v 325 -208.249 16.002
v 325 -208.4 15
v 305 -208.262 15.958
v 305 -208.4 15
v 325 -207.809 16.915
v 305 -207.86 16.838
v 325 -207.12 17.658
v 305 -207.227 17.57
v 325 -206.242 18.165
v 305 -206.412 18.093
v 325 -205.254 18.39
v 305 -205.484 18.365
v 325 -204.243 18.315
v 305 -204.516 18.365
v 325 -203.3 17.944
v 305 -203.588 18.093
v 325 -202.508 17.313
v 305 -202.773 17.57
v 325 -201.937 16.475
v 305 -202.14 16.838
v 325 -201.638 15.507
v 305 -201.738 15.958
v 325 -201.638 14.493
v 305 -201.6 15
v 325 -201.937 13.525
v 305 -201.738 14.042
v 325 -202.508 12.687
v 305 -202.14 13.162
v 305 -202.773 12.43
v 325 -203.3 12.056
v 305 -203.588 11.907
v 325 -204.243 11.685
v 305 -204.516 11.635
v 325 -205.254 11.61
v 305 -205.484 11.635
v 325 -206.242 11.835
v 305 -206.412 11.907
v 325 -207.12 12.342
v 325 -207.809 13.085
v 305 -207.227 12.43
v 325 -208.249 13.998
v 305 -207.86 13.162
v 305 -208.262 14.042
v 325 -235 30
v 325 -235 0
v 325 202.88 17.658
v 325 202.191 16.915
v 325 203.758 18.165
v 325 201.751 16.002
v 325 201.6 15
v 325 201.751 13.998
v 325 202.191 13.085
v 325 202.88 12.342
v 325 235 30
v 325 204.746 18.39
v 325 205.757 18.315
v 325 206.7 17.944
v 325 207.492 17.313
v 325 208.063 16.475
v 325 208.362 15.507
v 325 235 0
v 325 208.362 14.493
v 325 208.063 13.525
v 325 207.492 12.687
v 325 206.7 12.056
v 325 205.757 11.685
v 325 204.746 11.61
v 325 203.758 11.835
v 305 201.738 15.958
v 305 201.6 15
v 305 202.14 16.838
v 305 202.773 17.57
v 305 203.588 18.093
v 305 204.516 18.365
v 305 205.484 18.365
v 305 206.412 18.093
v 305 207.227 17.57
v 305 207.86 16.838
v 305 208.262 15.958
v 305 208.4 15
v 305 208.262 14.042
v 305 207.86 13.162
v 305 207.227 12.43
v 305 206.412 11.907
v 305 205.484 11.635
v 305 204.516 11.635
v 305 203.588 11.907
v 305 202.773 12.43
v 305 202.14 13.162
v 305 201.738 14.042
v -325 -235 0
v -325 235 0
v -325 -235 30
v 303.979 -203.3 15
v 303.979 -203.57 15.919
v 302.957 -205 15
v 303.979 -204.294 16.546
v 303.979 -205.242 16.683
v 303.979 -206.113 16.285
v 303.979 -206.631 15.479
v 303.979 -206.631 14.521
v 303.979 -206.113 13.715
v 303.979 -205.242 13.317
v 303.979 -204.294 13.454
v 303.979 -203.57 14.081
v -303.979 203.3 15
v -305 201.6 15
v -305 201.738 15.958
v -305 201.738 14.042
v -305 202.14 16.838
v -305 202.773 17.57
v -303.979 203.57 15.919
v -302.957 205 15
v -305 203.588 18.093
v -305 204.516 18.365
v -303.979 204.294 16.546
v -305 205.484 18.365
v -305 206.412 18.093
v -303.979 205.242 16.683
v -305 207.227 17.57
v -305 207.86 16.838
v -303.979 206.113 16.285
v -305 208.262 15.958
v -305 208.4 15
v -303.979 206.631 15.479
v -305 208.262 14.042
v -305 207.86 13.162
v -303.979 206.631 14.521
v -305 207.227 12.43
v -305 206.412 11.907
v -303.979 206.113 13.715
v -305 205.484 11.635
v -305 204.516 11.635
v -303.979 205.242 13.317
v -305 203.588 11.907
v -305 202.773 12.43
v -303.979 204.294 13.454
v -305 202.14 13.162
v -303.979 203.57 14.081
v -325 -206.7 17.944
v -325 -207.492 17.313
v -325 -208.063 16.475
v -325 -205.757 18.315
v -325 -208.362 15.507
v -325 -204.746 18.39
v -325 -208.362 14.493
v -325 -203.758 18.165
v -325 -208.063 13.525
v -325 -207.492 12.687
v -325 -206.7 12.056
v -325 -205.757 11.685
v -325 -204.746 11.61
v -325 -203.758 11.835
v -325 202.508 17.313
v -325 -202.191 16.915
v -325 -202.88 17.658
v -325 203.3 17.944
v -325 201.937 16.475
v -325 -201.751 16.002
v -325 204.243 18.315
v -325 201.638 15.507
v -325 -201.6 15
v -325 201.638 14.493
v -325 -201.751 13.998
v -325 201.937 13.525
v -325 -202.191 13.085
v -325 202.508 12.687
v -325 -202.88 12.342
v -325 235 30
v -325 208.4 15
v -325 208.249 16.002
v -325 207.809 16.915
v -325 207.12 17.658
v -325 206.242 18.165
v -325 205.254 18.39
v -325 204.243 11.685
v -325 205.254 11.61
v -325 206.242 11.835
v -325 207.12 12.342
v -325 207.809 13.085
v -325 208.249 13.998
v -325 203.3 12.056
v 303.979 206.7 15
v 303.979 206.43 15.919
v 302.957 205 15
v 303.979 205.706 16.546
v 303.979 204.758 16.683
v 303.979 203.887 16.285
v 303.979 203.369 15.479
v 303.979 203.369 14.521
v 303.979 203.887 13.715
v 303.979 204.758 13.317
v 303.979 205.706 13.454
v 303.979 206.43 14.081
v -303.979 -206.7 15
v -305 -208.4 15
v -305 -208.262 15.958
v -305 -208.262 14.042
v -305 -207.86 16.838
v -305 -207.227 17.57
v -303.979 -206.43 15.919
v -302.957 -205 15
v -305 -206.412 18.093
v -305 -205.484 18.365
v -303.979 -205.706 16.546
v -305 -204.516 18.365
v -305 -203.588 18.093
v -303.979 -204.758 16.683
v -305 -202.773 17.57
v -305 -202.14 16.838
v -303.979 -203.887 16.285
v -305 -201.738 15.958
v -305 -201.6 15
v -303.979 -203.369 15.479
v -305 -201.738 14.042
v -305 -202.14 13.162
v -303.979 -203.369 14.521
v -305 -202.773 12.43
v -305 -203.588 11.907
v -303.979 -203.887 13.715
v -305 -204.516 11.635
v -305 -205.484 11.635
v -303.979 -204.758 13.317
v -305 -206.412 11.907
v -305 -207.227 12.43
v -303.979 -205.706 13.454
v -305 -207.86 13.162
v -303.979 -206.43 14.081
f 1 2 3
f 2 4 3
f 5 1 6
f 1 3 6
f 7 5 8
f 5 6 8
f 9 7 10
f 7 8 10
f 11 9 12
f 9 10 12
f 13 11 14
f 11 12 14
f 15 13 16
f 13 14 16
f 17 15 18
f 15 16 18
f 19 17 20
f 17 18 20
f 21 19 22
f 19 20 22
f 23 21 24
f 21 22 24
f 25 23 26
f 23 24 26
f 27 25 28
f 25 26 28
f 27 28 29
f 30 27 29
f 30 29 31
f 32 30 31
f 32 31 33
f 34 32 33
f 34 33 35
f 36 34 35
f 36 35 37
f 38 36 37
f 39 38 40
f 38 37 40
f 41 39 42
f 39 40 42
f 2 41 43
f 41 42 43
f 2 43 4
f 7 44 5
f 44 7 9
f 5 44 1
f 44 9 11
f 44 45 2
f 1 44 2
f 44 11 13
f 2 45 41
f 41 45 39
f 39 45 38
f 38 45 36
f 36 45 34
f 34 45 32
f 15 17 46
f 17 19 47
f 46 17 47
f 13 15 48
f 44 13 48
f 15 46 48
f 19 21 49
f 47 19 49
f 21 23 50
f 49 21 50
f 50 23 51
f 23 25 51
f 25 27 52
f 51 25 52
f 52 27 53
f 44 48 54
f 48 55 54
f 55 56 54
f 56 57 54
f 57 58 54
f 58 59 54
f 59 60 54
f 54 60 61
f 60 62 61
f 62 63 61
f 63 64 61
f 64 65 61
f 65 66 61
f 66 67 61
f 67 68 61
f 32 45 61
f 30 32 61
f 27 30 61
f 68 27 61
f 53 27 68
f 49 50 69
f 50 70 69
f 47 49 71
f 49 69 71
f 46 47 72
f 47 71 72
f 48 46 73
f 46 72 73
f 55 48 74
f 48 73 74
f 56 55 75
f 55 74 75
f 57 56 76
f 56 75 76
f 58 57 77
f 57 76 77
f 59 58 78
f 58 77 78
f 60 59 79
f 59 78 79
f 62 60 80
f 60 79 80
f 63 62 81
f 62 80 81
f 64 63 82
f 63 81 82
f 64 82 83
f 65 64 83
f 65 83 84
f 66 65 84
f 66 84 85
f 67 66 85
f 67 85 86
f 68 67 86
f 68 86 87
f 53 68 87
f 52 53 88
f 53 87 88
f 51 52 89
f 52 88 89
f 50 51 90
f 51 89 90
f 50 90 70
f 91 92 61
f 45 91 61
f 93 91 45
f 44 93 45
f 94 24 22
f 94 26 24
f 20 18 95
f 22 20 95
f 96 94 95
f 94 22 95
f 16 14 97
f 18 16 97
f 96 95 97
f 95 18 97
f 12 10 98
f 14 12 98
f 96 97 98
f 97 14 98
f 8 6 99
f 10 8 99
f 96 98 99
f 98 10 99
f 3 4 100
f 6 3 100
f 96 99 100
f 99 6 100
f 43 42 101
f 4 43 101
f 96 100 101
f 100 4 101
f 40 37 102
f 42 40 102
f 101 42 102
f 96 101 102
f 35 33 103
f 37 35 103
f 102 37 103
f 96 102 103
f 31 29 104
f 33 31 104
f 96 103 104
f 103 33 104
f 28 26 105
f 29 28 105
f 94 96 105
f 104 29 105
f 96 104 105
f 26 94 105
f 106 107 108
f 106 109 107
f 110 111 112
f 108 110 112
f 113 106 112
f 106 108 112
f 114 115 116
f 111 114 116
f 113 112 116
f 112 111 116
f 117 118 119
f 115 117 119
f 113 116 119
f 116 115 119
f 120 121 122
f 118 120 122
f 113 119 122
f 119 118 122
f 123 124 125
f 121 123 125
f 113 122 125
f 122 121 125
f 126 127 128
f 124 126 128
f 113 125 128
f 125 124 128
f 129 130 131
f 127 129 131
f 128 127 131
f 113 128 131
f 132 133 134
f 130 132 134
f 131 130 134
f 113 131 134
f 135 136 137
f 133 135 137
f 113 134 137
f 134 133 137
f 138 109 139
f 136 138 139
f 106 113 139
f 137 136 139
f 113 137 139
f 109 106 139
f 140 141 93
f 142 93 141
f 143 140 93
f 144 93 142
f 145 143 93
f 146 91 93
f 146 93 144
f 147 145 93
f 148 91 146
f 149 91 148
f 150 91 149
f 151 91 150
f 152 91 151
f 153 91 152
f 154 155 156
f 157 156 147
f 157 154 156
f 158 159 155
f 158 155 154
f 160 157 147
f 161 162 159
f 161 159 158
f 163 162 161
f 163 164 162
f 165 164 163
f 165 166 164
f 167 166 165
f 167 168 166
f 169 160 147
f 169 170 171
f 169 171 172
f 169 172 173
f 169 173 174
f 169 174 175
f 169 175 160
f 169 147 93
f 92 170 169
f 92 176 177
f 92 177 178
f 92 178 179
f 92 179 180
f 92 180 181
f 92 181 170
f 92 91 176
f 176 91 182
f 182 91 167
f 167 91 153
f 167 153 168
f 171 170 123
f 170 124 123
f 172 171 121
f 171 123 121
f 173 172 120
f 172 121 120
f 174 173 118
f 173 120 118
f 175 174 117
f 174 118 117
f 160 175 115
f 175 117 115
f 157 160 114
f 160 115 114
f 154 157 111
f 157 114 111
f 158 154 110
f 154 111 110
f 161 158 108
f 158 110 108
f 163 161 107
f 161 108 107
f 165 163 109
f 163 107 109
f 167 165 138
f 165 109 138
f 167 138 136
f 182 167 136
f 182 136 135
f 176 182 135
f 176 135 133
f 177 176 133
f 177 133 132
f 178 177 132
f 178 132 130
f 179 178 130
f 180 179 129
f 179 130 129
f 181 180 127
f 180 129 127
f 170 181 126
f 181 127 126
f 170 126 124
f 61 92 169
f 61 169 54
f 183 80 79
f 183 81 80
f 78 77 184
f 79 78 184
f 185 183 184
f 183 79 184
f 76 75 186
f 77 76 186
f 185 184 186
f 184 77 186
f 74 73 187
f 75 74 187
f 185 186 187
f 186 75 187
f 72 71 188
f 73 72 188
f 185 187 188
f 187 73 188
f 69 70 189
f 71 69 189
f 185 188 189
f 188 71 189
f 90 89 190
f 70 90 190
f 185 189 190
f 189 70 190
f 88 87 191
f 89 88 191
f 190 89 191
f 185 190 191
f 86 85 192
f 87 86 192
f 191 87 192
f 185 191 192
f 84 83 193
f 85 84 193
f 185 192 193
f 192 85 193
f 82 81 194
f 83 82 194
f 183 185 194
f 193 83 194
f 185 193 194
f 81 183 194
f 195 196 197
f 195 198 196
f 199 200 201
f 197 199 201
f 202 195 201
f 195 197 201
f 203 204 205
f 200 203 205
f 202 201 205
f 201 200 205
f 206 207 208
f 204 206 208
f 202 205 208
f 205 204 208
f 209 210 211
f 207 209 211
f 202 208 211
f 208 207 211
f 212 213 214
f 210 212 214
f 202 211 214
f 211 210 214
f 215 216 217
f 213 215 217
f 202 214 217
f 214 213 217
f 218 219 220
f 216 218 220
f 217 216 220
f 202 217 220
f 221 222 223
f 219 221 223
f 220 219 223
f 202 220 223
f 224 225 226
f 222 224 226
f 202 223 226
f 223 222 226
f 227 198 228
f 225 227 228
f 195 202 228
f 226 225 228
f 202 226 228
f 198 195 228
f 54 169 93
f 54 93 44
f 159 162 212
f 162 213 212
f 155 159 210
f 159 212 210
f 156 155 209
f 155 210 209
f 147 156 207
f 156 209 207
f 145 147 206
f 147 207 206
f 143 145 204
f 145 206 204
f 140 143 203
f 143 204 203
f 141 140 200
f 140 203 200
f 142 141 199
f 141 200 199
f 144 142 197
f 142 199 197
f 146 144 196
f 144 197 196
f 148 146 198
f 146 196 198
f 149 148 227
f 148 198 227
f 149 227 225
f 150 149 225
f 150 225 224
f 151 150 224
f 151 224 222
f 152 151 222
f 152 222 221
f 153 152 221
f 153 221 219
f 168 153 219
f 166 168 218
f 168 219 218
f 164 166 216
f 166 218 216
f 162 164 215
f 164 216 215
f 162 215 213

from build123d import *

# Parameters (mm, degrees)
F0_W           = 650
F0_H           = 470
F1_DEPTH       = 30
F4_D           = 6.8
F4_DEPTH       = 20
F4_TIP         = 2.0429261047
F4_ON_F3_D     = 6.8
F4_ON_F3_DEPTH = 20
F4_ON_F3_TIP   = 2.0429261047


with BuildPart() as f1:
    # F0 (on Top) → F1 (new body)
    with BuildSketch(Plane.XY):
        Rectangle(F0_W, F0_H)
    extrude(amount=F1_DEPTH)

    # F4
    with Locations(Plane.YZ.offset(325)):
        with Locations((-205, 15), (205, 15)):
            Hole(F4_D / 2, depth=F4_DEPTH)
            with Locations((0, 0, -(F4_DEPTH + F4_TIP / 2))):  # 118° drill point
                Cone(0, F4_D / 2, F4_TIP, mode=Mode.SUBTRACT)

    # F4 on F3
    with Locations(Plane(origin=(-325, 0, 0), x_dir=(0, -1, 0), z_dir=(-1, 0, 0))):
        with Locations((-205, 15), (205, 15)):
            Hole(F4_ON_F3_D / 2, depth=F4_ON_F3_DEPTH)
            with Locations((0, 0, -(F4_ON_F3_DEPTH + F4_ON_F3_TIP / 2))):  # 118° drill point
                Cone(0, F4_ON_F3_D / 2, F4_ON_F3_TIP, mode=Mode.SUBTRACT)


solid = f1.part
